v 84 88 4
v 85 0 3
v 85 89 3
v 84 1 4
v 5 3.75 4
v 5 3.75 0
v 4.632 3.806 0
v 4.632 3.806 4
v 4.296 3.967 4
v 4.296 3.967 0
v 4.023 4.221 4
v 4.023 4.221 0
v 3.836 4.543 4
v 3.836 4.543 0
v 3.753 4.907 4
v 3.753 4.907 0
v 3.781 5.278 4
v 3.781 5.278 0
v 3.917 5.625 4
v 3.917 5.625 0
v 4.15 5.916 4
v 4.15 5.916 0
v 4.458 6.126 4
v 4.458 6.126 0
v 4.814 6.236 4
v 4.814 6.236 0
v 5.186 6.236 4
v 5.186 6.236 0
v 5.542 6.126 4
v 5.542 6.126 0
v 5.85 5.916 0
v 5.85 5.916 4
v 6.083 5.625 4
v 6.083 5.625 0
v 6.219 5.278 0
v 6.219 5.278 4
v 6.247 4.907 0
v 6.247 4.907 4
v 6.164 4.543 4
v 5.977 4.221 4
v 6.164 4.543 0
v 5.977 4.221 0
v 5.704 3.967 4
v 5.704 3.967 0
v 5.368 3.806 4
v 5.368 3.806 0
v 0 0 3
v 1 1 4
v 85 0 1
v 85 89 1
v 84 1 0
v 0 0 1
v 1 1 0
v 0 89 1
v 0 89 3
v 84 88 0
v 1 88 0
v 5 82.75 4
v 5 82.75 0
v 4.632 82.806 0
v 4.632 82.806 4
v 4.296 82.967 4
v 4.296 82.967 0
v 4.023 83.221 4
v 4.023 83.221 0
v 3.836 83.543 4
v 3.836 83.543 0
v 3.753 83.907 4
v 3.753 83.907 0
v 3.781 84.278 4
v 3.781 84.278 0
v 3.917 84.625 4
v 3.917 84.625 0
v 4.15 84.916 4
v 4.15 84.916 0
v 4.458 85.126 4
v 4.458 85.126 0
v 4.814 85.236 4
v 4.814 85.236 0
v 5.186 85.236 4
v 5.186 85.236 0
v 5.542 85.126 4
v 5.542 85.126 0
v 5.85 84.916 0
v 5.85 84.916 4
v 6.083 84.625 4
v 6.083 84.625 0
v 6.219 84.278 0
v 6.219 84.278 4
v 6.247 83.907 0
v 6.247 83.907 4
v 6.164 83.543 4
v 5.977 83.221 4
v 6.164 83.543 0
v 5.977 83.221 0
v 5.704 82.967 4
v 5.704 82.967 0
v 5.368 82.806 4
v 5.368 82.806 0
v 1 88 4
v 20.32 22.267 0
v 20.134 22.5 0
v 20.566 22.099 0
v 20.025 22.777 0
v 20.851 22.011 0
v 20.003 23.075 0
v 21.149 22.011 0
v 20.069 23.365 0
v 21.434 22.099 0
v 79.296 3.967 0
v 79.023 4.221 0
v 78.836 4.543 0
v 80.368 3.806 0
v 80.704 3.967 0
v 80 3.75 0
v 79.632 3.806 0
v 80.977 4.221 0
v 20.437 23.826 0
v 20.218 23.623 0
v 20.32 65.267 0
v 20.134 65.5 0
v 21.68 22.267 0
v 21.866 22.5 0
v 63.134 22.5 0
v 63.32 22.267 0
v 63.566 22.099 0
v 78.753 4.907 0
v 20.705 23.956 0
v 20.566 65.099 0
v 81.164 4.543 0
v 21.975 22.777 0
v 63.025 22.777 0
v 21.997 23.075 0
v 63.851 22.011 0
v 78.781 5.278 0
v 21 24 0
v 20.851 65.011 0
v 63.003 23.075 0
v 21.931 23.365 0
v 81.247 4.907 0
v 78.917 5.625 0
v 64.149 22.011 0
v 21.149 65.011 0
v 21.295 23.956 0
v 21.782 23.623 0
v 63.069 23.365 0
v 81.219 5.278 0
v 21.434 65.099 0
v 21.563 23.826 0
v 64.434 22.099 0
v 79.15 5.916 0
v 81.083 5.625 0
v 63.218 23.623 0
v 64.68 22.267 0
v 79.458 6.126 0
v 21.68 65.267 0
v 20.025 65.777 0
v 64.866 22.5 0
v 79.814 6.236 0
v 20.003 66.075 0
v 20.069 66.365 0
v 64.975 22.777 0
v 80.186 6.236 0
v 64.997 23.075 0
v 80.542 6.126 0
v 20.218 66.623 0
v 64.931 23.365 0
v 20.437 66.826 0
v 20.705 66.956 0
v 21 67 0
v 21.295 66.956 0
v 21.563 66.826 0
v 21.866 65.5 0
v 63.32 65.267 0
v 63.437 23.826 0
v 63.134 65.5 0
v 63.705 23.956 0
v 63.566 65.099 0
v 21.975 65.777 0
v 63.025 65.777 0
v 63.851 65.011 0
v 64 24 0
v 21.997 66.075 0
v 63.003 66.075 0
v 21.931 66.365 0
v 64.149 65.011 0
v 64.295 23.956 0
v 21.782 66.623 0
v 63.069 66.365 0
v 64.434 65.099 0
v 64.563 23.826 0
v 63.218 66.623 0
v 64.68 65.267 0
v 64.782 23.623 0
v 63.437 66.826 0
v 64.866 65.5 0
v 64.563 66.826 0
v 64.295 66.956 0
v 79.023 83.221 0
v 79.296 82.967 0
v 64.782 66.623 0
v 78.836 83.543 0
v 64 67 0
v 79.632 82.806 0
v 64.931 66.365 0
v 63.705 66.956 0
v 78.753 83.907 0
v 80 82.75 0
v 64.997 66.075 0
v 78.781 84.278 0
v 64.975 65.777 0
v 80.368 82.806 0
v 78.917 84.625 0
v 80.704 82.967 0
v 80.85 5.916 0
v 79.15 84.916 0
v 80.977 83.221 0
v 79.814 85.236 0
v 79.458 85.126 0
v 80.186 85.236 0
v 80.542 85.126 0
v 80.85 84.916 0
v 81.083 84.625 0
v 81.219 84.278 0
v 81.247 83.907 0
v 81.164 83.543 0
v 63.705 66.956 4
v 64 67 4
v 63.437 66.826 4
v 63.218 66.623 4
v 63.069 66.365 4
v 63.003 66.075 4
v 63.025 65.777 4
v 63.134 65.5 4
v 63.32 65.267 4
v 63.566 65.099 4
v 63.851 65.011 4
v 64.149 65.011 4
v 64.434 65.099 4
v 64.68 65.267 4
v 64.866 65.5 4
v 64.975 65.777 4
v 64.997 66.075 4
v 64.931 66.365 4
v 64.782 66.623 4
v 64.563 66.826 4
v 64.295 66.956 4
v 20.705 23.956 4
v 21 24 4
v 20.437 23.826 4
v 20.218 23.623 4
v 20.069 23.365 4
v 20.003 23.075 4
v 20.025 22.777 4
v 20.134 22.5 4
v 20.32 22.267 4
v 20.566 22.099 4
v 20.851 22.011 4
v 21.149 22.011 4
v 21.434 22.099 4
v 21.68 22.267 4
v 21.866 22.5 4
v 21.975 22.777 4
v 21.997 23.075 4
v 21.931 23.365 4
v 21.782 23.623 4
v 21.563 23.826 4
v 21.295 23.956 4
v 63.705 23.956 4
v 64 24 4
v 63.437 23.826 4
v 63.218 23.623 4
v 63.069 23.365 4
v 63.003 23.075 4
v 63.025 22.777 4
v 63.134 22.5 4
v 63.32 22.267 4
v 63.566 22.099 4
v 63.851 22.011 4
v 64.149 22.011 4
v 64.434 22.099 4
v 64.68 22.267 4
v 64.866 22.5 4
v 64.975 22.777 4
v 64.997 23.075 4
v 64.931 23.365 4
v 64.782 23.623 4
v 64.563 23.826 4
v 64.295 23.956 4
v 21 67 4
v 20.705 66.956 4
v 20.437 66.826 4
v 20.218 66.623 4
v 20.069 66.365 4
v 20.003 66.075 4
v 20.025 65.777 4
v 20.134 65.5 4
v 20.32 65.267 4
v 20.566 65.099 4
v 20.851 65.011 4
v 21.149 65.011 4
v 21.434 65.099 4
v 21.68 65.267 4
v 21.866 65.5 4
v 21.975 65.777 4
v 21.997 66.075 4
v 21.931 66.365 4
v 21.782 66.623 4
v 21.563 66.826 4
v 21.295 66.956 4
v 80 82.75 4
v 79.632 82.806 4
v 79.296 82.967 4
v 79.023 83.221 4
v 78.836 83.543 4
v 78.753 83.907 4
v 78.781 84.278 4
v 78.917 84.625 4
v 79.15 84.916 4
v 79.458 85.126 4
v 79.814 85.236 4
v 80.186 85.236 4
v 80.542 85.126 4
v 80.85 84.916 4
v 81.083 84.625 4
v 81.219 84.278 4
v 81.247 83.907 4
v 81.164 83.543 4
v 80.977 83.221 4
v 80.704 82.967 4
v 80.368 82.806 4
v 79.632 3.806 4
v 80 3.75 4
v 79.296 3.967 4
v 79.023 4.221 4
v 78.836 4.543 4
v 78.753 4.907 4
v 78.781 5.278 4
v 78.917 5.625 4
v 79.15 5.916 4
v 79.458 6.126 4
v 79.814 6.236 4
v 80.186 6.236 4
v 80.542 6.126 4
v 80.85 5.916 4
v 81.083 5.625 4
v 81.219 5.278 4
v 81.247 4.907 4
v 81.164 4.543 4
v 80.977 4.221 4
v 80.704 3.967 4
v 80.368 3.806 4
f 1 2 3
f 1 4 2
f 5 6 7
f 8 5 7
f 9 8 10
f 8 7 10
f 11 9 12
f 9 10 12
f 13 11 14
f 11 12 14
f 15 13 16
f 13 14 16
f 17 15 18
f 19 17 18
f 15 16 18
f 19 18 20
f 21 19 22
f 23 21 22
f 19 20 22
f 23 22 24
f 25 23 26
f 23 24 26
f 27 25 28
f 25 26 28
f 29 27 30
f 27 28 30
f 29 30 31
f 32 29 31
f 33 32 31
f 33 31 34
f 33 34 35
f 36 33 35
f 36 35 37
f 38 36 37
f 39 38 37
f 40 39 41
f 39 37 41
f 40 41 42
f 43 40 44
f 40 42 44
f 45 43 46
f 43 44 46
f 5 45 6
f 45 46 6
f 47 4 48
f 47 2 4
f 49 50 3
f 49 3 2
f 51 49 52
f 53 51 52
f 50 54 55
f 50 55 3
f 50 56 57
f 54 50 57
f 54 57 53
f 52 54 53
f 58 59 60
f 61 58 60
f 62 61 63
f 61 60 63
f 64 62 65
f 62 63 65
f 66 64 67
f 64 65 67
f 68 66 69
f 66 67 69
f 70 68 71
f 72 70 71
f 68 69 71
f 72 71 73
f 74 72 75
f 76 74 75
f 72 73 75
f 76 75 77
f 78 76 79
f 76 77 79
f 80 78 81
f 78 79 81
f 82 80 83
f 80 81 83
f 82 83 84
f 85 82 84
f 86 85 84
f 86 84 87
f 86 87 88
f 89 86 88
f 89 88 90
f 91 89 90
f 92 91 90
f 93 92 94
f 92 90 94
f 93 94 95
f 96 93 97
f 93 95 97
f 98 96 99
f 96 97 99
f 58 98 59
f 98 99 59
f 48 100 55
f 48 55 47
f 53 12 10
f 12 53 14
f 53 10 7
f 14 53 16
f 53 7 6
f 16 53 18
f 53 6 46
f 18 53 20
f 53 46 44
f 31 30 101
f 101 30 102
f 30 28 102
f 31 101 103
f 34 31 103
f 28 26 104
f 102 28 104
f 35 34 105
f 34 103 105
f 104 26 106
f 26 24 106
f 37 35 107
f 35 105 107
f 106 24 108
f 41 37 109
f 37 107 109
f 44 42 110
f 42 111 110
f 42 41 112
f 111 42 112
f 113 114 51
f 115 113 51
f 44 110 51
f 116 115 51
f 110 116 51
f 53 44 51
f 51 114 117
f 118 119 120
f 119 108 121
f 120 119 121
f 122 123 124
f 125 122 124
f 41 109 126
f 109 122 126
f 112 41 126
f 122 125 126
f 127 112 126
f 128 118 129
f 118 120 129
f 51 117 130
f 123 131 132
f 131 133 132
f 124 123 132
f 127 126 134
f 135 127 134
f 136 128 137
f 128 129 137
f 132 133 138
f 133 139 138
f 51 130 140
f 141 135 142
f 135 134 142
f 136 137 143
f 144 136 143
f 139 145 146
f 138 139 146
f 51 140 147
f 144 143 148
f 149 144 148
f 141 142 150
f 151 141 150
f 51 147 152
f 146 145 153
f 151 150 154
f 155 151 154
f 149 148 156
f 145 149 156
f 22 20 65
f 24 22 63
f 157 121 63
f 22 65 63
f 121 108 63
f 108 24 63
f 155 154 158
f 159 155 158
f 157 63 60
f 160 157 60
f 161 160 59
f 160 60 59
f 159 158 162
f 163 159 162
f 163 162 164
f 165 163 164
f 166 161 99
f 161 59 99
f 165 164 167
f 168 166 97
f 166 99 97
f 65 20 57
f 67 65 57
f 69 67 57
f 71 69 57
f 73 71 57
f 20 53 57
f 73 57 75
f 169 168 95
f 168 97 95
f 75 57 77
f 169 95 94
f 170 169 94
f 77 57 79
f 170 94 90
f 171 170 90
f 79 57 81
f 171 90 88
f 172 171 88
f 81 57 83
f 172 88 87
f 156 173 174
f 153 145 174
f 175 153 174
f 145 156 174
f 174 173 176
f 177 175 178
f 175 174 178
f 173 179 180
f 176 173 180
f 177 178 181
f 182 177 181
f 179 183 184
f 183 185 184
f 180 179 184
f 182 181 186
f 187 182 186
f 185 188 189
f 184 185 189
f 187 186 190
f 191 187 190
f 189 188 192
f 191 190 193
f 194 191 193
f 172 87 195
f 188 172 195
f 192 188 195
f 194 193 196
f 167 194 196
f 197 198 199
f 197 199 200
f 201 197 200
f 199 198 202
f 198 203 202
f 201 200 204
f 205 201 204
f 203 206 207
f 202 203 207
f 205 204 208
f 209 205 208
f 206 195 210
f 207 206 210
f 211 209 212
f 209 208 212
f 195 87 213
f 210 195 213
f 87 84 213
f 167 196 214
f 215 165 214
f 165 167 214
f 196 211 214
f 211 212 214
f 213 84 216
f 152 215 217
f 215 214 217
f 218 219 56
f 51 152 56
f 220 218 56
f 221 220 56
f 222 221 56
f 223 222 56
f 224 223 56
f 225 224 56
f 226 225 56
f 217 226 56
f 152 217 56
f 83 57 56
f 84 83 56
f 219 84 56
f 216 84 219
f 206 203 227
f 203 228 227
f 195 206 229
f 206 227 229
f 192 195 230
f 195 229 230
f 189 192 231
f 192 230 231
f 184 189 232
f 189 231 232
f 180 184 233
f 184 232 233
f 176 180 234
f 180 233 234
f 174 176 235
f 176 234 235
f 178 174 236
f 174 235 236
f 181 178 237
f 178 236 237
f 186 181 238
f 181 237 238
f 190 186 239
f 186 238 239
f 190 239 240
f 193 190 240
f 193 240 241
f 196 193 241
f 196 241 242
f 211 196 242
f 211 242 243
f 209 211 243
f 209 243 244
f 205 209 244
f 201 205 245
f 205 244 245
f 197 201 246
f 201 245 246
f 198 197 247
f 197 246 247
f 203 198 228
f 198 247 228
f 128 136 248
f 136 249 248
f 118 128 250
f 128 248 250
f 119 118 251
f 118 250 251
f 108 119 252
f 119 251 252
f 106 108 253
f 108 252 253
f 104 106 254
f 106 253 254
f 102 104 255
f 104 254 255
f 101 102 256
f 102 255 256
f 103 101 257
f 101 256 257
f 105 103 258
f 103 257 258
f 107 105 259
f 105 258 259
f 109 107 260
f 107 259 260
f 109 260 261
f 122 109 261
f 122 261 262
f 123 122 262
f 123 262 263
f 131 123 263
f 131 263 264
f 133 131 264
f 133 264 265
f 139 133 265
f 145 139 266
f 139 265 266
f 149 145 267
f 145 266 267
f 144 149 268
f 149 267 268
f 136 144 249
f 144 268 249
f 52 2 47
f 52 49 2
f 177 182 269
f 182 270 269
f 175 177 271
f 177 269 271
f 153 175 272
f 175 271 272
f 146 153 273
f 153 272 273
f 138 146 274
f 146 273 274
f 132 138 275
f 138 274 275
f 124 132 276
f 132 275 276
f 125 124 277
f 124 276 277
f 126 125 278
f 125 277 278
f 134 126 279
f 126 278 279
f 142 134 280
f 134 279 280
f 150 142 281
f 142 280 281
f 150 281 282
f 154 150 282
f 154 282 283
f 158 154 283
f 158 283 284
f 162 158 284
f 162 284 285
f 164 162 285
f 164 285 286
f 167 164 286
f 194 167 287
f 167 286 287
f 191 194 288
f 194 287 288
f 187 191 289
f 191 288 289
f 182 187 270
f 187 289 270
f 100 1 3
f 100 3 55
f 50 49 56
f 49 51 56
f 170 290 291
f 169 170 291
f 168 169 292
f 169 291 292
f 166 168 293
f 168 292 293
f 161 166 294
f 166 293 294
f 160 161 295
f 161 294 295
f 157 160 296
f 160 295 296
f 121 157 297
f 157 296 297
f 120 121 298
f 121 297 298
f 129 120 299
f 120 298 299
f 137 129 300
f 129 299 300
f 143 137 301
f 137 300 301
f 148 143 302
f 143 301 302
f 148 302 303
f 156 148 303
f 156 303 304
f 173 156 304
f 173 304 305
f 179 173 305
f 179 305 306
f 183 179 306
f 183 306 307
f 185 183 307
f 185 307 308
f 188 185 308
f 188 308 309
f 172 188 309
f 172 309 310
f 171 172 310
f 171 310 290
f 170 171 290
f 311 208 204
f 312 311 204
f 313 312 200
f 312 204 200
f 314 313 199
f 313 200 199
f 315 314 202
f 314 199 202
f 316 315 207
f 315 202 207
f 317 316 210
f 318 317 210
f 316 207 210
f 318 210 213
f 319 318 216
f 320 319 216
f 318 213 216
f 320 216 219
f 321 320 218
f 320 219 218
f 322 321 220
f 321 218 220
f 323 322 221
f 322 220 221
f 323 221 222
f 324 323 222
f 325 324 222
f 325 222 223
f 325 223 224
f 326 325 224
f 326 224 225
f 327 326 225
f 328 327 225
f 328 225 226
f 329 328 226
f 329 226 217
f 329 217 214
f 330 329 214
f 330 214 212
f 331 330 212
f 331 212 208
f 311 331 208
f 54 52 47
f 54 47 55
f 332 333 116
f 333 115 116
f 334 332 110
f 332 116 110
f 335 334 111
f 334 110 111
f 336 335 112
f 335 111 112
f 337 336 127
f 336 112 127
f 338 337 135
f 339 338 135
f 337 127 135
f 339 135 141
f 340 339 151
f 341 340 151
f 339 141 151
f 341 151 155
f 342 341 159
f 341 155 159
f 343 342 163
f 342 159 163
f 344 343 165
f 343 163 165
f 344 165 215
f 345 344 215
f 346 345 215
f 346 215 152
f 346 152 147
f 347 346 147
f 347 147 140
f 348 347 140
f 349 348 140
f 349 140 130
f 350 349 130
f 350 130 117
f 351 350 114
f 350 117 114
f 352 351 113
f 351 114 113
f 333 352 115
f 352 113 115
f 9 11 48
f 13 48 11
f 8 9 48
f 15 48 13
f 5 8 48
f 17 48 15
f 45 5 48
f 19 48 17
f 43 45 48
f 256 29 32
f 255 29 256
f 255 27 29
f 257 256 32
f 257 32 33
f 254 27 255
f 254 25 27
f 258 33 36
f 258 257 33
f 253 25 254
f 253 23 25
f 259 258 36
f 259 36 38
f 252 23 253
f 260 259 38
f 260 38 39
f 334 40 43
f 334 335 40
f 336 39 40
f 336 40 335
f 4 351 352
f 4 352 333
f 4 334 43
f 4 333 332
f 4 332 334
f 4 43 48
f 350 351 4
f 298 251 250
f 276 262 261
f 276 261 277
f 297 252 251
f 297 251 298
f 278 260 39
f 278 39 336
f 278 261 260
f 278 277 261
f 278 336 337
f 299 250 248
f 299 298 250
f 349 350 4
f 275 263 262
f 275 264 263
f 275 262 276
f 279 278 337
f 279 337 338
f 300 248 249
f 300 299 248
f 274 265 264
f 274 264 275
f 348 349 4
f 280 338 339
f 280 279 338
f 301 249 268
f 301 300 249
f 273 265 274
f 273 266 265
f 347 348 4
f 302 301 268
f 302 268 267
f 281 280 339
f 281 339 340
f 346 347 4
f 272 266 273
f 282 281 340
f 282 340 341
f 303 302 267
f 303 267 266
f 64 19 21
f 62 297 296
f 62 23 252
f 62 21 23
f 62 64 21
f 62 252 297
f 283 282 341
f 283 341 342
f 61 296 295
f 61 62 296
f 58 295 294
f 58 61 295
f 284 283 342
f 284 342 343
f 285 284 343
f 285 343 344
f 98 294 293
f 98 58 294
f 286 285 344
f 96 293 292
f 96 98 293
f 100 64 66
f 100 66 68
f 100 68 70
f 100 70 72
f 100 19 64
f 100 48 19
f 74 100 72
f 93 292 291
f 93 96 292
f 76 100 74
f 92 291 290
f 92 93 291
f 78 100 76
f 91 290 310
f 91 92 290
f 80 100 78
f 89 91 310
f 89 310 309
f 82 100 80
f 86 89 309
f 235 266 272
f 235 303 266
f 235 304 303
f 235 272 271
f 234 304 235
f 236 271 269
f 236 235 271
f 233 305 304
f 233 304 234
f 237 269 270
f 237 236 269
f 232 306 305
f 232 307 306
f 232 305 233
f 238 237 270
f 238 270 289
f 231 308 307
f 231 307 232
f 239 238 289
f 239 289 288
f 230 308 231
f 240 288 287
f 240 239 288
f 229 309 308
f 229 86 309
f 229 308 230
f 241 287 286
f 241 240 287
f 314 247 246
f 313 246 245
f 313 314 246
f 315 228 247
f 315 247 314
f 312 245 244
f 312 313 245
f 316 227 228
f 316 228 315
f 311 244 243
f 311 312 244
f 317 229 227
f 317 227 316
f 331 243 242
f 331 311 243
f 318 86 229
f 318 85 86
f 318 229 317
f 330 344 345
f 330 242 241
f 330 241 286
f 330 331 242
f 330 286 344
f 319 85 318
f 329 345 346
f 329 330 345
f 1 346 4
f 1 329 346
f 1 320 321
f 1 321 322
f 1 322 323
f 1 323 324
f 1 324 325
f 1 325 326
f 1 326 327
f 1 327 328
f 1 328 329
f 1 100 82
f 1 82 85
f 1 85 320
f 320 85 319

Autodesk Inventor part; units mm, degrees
ref_plane "YZ Plane" through (0, 0, 0) normal (1, 0, 0) x (0, 1, 0)
ref_plane "XZ Plane" through (0, 0, 0) normal (0, 1, 0) x (-1, 0, 0)
ref_plane "XY Plane" through (0, 0, 0) normal (0, 0, 1) x (1, 0, 0)
sketch "Esquisse1" plane through (0, 0, 0) normal (0, 0, 1) x (1, 0, 0)
  line L0 (0, 89) -> (85, 89)
  line L1 (85, 89) -> (85, 0)
  line L2 (85, 0) -> (0, 0)
  line L3 (0, 0) -> (0, 89)
  line L4 (-17.3397, 0) -> (102.0566, 0) projected
  line L5 (0, -18.665) -> (0, 106.9442) projected
  point P0 (0, 0)
  dimension "d0" = 85
  dimension "d1" = 89
extrude "Extrusion1" add sketch "Esquisse1" along normal blind 4
sketch "Esquisse2" plane through (0, 0, 4) normal (0, 0, 1) x (1, 0, 0)
  line L0 (85, 0) -> (85, 89) projected
  line L1 (0, 89) -> (0, 0) projected
  line L2 (85, 89) -> (0, 89) projected
  line L3 (0, 0) -> (85, 0) projected
  point P0 (5, 84)
  point P1 (80, 84)
  point P2 (80, 5)
  point P3 (5, 5)
  dimension "d16" = 75
  dimension "d17" = 75
  dimension "d18" = 79
  dimension "d19" = 79
  dimension "d20" = 5
  dimension "d21" = 5
  dimension "d22" = 5
  dimension "d23" = 5
hole "Perçage1" at (5, 84, 4) at (80, 84, 4) at (80, 5, 4) at (5, 5, 4) direction (0, 0, -1) diameter 2.5 end through all
sketch "Esquisse3" plane through (0, 0, 0) normal (0, 0, -1) x (-1, 0, 0)
  line L0 (0, 0) -> (0, 89) projected
  line L1 (0, 89) -> (-85, 89) projected
  point P0 (-21, 66)
  point P1 (-21, 23)
  point P2 (-64, 23)
  point P3 (-64, 66)
  dimension "d32" = 43
  dimension "d33" = 43
  dimension "d34" = 43
  dimension "d35" = 43
  dimension "d36" = 21
  dimension "d44" = 21
  dimension "d45" = 23
  dimension "d46" = 23
hole "Perçage2" at (21, 66, 0) at (21, 23, 0) at (64, 23, 0) at (64, 66, 0) direction (0, 0, 1) diameter 2 end through all
chamfer "Chanfrein1" distance 1 angle 45 8 edges at (42.5, 0, 0) (42.5, 0, 4) (85, 44.5, 0) (42.5, 89, 0) (0, 44.5, 0) (0, 44.5, 4) (85, 44.5, 4) (42.5, 89, 4)
equation "\"d17\" = d16"
equation "\"d19\" = d18"
equation "\"d21\" = d20"
equation "\"d22\" = d21"
equation "\"d23\" = d20"
equation "\"d33\" = d32"
equation "\"d34\" = d33"
equation "\"d35\" = d33"
equation "\"d44\" = d36"
equation "\"d46\" = d45"
properties part number "support lidar"
